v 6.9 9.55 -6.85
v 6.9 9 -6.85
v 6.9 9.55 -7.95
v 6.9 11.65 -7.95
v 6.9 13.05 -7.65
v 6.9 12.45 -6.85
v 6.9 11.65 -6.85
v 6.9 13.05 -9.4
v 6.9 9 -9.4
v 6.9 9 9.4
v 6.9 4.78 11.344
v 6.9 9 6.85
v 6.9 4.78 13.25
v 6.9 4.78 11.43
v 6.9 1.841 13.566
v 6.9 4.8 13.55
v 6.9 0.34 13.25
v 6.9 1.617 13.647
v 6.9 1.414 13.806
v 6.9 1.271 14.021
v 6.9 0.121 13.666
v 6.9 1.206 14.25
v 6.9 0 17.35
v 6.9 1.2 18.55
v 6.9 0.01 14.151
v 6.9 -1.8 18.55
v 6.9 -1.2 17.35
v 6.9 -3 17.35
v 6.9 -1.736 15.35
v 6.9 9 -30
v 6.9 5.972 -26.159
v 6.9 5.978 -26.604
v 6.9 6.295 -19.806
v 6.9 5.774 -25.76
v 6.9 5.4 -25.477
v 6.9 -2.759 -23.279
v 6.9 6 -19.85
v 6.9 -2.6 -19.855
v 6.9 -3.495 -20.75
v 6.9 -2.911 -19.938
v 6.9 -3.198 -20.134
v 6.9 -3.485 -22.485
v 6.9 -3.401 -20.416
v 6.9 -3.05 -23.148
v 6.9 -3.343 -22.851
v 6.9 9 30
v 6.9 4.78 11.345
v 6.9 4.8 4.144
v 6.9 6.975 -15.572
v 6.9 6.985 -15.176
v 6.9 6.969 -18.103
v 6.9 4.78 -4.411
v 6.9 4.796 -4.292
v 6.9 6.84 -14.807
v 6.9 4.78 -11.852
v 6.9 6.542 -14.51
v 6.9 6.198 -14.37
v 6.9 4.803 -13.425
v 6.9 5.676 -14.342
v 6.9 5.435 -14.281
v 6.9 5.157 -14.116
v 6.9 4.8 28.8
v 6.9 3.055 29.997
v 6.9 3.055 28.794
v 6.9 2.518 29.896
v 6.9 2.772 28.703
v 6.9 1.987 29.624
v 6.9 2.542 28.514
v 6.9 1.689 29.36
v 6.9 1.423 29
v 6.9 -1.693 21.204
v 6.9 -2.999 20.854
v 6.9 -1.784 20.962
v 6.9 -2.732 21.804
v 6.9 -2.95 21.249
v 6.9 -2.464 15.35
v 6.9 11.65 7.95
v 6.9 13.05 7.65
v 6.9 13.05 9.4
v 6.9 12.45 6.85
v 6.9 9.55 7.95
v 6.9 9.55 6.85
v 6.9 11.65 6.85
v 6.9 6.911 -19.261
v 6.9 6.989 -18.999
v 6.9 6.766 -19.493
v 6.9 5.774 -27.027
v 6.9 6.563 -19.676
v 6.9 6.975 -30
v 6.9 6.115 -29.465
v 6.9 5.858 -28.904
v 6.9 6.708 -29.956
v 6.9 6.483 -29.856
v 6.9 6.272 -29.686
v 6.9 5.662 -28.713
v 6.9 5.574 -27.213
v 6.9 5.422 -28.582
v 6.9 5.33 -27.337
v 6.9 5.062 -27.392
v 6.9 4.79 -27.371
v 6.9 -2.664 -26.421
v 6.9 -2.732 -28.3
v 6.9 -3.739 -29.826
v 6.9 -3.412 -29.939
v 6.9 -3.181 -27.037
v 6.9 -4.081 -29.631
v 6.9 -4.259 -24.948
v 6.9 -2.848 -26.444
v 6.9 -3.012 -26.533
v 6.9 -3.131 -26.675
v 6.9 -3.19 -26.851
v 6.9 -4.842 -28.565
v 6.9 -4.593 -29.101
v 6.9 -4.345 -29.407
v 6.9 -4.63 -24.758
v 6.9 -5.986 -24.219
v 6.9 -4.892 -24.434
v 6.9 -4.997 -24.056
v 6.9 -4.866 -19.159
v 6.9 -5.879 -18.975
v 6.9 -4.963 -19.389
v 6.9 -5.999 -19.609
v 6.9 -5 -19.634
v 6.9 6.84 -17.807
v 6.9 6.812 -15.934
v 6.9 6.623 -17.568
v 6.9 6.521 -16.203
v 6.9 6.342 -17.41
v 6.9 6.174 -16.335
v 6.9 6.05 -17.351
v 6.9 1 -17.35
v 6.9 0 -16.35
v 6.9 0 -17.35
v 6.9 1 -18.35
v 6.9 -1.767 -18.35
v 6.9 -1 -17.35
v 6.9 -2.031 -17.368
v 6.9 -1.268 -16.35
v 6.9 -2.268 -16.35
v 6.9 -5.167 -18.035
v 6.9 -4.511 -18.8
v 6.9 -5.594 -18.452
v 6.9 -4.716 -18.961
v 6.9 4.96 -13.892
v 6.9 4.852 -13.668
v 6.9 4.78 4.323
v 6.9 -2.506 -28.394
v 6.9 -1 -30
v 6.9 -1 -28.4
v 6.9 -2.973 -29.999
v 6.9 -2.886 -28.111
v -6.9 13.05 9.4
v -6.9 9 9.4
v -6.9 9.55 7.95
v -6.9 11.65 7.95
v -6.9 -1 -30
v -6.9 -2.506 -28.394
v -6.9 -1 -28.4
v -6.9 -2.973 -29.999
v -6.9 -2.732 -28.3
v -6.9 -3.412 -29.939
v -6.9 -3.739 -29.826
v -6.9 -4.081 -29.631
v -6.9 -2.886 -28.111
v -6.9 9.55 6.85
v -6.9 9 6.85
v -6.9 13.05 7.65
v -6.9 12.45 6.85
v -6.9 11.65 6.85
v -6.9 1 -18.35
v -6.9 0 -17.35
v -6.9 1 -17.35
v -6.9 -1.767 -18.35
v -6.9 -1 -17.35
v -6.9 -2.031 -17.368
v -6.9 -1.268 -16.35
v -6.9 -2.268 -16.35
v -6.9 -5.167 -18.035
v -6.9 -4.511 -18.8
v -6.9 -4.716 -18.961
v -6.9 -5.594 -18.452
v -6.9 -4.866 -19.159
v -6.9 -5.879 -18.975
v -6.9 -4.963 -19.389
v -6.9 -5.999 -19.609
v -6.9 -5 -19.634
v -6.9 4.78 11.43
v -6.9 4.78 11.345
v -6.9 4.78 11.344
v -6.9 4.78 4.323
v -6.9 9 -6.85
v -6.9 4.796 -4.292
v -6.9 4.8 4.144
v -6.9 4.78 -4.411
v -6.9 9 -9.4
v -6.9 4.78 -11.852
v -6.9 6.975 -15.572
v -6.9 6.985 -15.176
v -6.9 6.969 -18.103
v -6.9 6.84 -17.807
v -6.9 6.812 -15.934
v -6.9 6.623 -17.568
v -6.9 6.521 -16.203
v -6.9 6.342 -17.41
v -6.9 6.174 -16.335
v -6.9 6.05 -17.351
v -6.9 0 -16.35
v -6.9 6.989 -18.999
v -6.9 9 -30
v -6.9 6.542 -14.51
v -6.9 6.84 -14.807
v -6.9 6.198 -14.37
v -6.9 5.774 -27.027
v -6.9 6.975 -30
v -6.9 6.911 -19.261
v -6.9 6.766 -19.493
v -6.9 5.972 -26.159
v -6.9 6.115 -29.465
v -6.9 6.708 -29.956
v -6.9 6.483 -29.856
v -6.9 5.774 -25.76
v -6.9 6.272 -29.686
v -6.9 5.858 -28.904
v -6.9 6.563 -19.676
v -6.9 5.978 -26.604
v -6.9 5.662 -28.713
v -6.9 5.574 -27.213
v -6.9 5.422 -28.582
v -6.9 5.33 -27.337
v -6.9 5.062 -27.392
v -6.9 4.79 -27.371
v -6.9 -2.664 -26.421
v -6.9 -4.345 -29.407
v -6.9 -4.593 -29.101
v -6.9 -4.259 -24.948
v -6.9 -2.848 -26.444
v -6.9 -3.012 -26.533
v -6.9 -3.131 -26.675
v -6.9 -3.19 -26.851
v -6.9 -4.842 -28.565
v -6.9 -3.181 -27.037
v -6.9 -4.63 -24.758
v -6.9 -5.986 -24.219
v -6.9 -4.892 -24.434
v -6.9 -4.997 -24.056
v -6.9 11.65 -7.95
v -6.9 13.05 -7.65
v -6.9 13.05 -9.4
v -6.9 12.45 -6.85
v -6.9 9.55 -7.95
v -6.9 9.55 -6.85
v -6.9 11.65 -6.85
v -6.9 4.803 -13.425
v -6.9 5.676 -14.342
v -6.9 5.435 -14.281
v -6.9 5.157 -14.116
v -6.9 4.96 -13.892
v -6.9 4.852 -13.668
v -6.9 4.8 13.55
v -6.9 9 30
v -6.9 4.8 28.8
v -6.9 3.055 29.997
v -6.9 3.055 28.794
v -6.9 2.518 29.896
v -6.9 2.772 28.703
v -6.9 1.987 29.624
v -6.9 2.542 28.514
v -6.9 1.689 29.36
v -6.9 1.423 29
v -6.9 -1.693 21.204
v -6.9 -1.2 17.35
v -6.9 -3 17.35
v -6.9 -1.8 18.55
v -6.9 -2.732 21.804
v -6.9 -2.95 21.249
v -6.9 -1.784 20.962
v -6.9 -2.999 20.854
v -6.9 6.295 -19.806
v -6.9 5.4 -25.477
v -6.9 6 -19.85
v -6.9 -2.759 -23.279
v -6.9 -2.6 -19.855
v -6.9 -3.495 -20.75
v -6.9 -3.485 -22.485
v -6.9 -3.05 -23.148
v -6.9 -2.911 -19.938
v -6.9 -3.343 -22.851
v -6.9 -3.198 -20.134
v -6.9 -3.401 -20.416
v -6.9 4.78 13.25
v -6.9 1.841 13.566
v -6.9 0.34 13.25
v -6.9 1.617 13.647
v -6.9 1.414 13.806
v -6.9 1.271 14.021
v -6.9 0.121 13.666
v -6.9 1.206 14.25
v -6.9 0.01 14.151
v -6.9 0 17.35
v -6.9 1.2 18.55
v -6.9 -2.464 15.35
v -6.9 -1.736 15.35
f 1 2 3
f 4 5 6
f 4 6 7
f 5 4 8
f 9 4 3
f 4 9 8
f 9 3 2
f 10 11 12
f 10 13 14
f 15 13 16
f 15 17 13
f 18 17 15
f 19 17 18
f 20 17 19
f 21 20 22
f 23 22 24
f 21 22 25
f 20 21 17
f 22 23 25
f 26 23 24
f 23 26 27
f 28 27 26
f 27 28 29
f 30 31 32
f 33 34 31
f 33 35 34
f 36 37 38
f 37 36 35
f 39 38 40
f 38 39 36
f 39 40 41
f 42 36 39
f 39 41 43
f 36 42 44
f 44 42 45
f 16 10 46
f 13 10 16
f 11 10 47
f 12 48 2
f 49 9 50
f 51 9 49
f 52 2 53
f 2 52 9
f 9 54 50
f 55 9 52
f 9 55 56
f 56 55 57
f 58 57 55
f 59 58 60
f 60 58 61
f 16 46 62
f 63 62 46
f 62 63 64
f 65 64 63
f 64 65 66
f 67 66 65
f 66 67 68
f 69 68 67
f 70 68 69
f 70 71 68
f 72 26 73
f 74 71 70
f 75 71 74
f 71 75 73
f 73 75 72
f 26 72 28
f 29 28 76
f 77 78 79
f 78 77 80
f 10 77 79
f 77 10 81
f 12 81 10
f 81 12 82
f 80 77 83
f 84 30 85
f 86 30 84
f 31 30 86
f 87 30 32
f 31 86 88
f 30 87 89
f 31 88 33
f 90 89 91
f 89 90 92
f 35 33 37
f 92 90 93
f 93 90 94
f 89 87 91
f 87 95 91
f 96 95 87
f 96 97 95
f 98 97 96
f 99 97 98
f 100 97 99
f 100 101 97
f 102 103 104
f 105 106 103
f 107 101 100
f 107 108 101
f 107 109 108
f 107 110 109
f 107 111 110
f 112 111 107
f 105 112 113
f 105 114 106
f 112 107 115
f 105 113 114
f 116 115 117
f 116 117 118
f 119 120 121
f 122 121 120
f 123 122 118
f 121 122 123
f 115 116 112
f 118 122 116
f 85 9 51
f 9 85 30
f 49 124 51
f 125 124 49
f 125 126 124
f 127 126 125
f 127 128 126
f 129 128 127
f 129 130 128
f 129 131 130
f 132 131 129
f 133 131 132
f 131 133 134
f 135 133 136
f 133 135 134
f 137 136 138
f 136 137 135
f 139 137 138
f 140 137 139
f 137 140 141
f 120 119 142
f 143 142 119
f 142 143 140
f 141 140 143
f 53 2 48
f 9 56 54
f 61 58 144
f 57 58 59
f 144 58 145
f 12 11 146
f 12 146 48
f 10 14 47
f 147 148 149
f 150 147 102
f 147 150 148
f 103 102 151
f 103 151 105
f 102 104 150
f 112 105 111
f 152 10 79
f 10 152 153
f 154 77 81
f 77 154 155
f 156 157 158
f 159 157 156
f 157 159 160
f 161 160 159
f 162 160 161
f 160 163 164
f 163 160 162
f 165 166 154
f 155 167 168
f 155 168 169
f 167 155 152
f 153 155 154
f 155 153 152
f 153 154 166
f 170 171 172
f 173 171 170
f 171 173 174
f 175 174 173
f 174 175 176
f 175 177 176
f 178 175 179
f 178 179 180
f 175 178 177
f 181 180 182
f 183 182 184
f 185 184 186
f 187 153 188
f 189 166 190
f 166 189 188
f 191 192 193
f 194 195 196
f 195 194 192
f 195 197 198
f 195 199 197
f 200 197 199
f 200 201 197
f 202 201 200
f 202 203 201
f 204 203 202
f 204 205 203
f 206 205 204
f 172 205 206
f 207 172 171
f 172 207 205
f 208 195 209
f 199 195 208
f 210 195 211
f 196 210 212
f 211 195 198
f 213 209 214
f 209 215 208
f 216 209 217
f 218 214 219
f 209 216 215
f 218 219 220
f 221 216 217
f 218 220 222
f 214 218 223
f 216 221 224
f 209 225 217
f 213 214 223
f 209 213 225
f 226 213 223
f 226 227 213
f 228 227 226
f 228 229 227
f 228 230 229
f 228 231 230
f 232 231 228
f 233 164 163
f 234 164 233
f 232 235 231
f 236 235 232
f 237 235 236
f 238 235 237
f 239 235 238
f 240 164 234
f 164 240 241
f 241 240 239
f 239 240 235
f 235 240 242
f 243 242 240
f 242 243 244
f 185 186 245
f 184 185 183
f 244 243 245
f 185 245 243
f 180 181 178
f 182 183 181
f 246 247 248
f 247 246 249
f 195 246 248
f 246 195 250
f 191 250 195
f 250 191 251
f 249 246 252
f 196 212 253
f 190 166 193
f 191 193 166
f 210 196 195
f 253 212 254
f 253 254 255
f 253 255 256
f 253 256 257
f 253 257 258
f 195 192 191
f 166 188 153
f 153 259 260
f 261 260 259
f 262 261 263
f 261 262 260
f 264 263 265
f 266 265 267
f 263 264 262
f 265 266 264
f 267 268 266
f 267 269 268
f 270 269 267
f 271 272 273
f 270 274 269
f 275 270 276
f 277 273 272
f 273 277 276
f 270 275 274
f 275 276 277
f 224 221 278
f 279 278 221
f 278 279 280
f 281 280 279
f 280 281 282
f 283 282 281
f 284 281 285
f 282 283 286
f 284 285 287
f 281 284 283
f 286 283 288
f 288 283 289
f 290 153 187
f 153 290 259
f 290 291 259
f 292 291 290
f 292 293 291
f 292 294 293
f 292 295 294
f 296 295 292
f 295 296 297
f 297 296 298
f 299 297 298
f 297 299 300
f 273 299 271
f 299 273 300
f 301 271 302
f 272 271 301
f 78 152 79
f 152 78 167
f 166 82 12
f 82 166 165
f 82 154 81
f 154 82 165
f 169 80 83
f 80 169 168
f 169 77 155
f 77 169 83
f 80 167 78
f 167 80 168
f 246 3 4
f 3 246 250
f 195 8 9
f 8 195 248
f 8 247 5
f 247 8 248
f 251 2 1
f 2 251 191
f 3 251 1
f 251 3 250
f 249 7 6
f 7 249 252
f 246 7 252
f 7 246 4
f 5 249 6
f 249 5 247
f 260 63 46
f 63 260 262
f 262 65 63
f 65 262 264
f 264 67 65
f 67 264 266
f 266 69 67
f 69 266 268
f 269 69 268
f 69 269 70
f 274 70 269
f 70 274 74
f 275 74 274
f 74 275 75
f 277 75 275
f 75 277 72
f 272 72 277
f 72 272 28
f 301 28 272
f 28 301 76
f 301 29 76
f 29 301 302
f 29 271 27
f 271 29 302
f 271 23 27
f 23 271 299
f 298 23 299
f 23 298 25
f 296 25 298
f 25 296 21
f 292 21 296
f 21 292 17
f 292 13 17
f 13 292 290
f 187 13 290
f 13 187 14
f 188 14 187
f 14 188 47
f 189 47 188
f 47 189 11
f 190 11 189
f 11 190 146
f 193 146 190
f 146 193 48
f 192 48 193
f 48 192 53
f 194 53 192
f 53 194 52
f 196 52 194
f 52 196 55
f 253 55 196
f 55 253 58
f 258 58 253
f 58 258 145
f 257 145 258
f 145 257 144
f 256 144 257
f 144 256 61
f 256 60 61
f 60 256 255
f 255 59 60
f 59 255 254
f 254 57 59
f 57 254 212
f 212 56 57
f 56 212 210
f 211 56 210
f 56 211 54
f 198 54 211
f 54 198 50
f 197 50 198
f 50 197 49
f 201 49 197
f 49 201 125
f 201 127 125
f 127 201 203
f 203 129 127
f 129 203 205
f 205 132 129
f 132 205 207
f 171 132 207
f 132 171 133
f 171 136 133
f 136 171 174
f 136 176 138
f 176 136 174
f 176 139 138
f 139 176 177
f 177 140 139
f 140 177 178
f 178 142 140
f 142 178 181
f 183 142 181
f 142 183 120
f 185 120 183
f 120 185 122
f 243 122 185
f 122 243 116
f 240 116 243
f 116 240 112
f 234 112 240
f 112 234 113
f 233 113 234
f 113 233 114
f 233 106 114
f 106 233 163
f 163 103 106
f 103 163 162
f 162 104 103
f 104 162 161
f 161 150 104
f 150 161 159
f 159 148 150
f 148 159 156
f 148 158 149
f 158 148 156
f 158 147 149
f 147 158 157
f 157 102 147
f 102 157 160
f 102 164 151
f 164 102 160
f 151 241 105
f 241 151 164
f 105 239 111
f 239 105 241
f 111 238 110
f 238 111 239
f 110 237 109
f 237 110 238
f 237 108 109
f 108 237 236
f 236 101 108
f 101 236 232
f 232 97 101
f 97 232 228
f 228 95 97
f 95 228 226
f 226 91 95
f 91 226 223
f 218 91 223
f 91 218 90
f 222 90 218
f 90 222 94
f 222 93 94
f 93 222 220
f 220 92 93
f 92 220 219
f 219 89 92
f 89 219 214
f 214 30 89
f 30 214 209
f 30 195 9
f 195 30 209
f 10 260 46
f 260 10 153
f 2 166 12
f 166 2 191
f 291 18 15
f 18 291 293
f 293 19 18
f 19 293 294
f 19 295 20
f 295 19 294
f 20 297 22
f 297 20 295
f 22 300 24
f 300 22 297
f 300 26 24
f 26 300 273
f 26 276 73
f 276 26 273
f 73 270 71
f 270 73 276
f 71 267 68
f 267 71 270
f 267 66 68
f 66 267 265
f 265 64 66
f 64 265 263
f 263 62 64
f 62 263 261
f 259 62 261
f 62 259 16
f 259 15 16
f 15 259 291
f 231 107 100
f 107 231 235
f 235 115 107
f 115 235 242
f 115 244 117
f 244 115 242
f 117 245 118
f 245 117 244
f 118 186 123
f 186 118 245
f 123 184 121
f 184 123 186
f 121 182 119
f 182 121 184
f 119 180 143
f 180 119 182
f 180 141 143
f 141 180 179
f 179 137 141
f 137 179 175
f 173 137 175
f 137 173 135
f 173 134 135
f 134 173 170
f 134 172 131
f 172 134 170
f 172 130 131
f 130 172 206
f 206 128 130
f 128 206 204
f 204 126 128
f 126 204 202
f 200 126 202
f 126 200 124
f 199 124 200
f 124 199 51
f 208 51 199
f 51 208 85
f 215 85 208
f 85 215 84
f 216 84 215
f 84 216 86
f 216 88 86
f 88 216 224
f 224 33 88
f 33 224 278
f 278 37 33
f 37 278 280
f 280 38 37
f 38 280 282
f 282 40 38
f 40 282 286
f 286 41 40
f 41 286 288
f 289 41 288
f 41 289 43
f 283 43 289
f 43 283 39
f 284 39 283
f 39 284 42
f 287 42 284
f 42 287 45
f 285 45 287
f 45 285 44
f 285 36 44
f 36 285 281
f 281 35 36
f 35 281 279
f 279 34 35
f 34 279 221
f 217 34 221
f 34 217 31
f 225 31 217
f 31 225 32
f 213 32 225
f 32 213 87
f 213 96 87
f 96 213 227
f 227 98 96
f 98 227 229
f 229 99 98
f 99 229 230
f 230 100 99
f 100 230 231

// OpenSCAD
// HiLetgo level-shifter DIN mount — Cable Clamp remix
// Design version: 6
// VERSIONING RULE: Increment design_version by 1 for every repository check-in of this design.
//
// This is the official HiLetgo level-shifter DIN holder for this project.
// It is based on the user-supplied DIN_Rail_Cable_Clamp.step.
//
// What changed from the cable clamp:
//   1. The two center cable-rest arms are removed completely.
//   2. The two rectangular cable-tie slots in the spine are filled.
//   3. A true full-width top/bottom slide cradle is added for the HiLetgo PCB.
//   4. The PCB is parallel to the DIN rail and slides in from either X side.
//   5. v4 flips the PCB cradle to the OPPOSITE (+Y) face of the DIN body.
//      The v3 cradle was on the cable-clamp-arm side; this version mounts the
//      PCB on the other side of the central DIN spine.
//   6. v5 widens the entire DIN clip body to exactly match the PCB cradle width.
//      There is no longer a wider cradle sitting on a narrower DIN body.
//   7. v6 renames the official source file to remove the ChatGPT prefix.
//
// The original STEP is effectively a 6 mm-wide extrusion. To keep this
// OpenSCAD source compact and robust, its center-plane Y/Z profile was captured
// from the STEP-derived mesh and simplified to ~0.03 mm. In v5 that same DIN
// spring/hook profile is extruded to the PCB cradle width instead of the original
// 6 mm, so the complete mount has one consistent width.

$fn = 48;
design_version = 6;

// ---------- HiLetgo PCB ----------
pcb_z = 15.3;             // board height in installed orientation
pcb_x = 12.6;             // board width across the DIN clip
pcb_t = 1.6;              // board thickness (Y)
pcb_edge_clear = 0.30;     // top/bottom clearance
pcb_face_clear = 0.25;     // front/rear clearance

// ---------- Mount / cradle ----------
cradle_side_margin = 0.60;
mount_width = pcb_x + 2*cradle_side_margin;  // 13.8 mm: DIN body and PCB cradle match
spine_front_y = 4.80;      // cable-arm side of the remaining center spine
spine_back_y = 9.00;       // opposite face of the DIN spine

// v4: PCB holder is on the +Y side of the spine (opposite v3).
// The board sits just outside the spine and slides in from either X side.
pcb_inner_y = spine_back_y + 0.80;
pcb_outer_y = pcb_inner_y + pcb_t;
slot_inner_y = pcb_inner_y - pcb_face_clear;
slot_outer_y = pcb_outer_y + pcb_face_clear;

board_half_z = pcb_z/2;
channel_inner_z = board_half_z + pcb_edge_clear;
channel_wall_t = 1.45;
channel_outer_z = channel_inner_z + channel_wall_t;
edge_overlap = 1.10;
outer_lip_t = 0.80;
lead_in = 0.60;

cradle_width_x = mount_width;  // exactly the same width as the DIN clip body

// ---------- STEP-derived 2D DIN profile ----------
// Coordinates are [Y depth, Z vertical].  Only the two DIN-spring voids are
// retained as holes.  The original rectangular cable-tie slots are intentionally
// NOT subtracted, so they become solid in this PCB-mount remix.
source_outer = [
    [0.0000, -16.3500],
    [0.0000, -17.3500],
    [-1.0000, -17.3500],
    [-1.2679, -16.3500],
    [-2.2679, -16.3500],
    [-5.1675, -18.0355],
    [-5.5943, -18.4518],
    [-5.8794, -18.9754],
    [-5.9994, -19.6095],
    [-5.9859, -24.2194],
    [-4.8419, -28.5652],
    [-4.5932, -29.1009],
    [-4.3446, -29.4072],
    [-4.0813, -29.6307],
    [-3.7387, -29.8263],
    [-3.4123, -29.9393],
    [-2.9728, -29.9994],
    [-1.0000, -30.0000],
    [-1.0000, -28.4000],
    [-2.5064, -28.3945],
    [-2.7320, -28.3004],
    [-2.8860, -28.1106],
    [-3.1812, -27.0372],
    [-3.1905, -26.8515],
    [-3.1313, -26.6752],
    [-3.0118, -26.5328],
    [-2.8485, -26.4439],
    [-2.6640, -26.4208],
    [5.4219, -28.5823],
    [5.6620, -28.7130],
    [5.8577, -28.9039],
    [6.1149, -29.4654],
    [6.2722, -29.6858],
    [6.4830, -29.8560],
    [6.7079, -29.9564],
    [6.9753, -29.9997],
    [9.0000, -30.0000],
    [9.0000, 30.0000],
    [3.0550, 29.9975],
    [2.5177, 29.8959],
    [1.9872, 29.6239],
    [1.6886, 29.3603],
    [1.4226, 29.0000],
    [-2.7321, 21.8038],
    [-2.9499, 21.2489],
    [-2.9994, 20.8537],
    [-3.0000, 17.3500],
    [-2.4641, 15.3500],
    [-1.7359, 15.3500],
    [-1.2000, 17.3500],
    [0.0000, 17.3500],
    [0.0099, 14.1509],
    [0.1206, 13.6660],
    [0.3761, 13.1825],
    [0.6035, 12.9183],
    [0.8734, 12.6975],
    [1.1774, 12.5270],
    [1.5550, 12.4001],
    [1.9501, 12.3506],
    [4.0143, 12.3490],
    [4.3492, 12.2596],
    [4.6306, 12.0247],
    [4.7784, 11.7112],
    [4.7805, 11.3446],
    [4.6238, 11.0132],
    [4.2831, 10.7568],
    [4.0647, 10.7016],
    [3.8396, 10.7075],
    [-1.0000, 12.0000],
    [-5.1490, 11.9888],
    [-5.4339, 11.9010],
    [-5.6802, 11.7331],
    [-5.8782, 11.4783],
    [-5.9802, 11.1981],
    [-5.9888, 8.8510],
    [-5.8400, 8.4575],
    [-5.5214, 8.1467],
    [-5.2708, 8.0374],
    [-5.0249, 8.0003],
    [-1.0000, 8.0000],
    [2.7186, 6.9998],
    [3.4513, 6.6486],
    [4.0135, 6.1689],
    [4.4757, 5.5006],
    [4.7262, 4.8053],
    [4.8000, 4.1439],
    [4.7963, -4.2920],
    [4.7262, -4.8053],
    [4.5965, -5.2301],
    [4.4055, -5.6311],
    [4.1573, -5.9994],
    [3.8030, -6.3773],
    [3.4513, -6.6486],
    [3.0634, -6.8649],
    [2.5765, -7.0417],
    [-1.0000, -8.0000],
    [-5.1981, -8.0198],
    [-5.4783, -8.1218],
    [-5.6982, -8.2841],
    [-5.8782, -8.5217],
    [-5.9749, -8.7775],
    [-6.0000, -11.0000],
    [-5.9691, -11.2468],
    [-5.8660, -11.5000],
    [-5.6802, -11.7331],
    [-5.4562, -11.8899],
    [-5.1981, -11.9802],
    [-1.0000, -12.0000],
    [3.5893, -10.7716],
    [3.9095, -10.7551],
    [4.2407, -10.8515],
    [4.5847, -11.1292],
    [4.7753, -11.5281],
    [4.8028, -13.4247],
    [4.8521, -13.6685],
    [4.9600, -13.8925],
    [5.1572, -14.1160],
    [5.4347, -14.2809],
    [5.6757, -14.3422],
    [6.1981, -14.3698],
    [6.5425, -14.5100],
    [6.8400, -14.8075],
    [6.9848, -15.1764],
    [6.9749, -15.5725],
    [6.8119, -15.9337],
    [6.5214, -16.2033],
    [6.1736, -16.3348],
];

lower_spring_void = [
    [-4.5107, -18.7997],
    [-2.0306, -17.3676],
    [-1.7673, -18.3500],
    [1.0000, -18.3500],
    [1.0000, -17.3500],
    [6.0498, -17.3512],
    [6.3420, -17.4103],
    [6.6235, -17.5682],
    [6.8400, -17.8075],
    [6.9691, -18.1032],
    [6.9888, -18.9990],
    [6.9115, -19.2613],
    [6.7660, -19.4928],
    [6.5633, -19.6762],
    [6.2948, -19.8056],
    [6.0000, -19.8500],
    [-2.5996, -19.8550],
    [-2.9113, -19.9385],
    [-3.1982, -20.1341],
    [-3.4010, -20.4161],
    [-3.4950, -20.7504],
    [-3.4851, -22.4854],
    [-3.3429, -22.8514],
    [-3.0504, -23.1483],
    [-2.7588, -23.2793],
    [5.3999, -25.4770],
    [5.7740, -25.7604],
    [5.9721, -26.1589],
    [5.9776, -26.6039],
    [5.7740, -27.0267],
    [5.5736, -27.2127],
    [5.3303, -27.3374],
    [5.0623, -27.3916],
    [4.7896, -27.3712],
    [-4.2588, -24.9479],
    [-4.6301, -24.7585],
    [-4.8919, -24.4342],
    [-4.9973, -24.0560],
    [-4.9997, -19.6345],
    [-4.9626, -19.3886],
    [-4.8660, -19.1594],
    [-4.7159, -18.9612],
];

upper_spring_void = [
    [4.8000, 28.8000],
    [4.8000, 13.5500],
    [1.8415, 13.5659],
    [1.6174, 13.6474],
    [1.4136, 13.8059],
    [1.2708, 14.0210],
    [1.2062, 14.2505],
    [1.2000, 18.5500],
    [-1.8000, 18.5500],
    [-1.7841, 20.9624],
    [-1.6928, 21.2038],
    [2.5419, 28.5142],
    [2.7721, 28.7026],
    [3.0552, 28.7938],
];

module source_profile_2d() {
    difference() {
        polygon(points=source_outer);
        polygon(points=lower_spring_void);
        polygon(points=upper_spring_void);
    }
}

module rect_yz(y0,y1,z0,z1) {
    translate([y0,z0]) square([y1-y0,z1-z0], center=false);
}

module clip_without_cable_arms_2d() {
    difference() {
        source_profile_2d();
        // Removes both center cable-rest arms while stopping just before the
        // central spine.  Upper/lower DIN spring hooks are untouched.
        rect_yz(-6.20, spine_front_y-0.02, -13.25, 13.25);
    }
}

module din_clip_body() {
    // Original DIN clip, with the cable-rest arms removed.
    multmatrix([
        [0,0,1,0],
        [1,0,0,0],
        [0,1,0,0],
        [0,0,0,1]
    ])
        linear_extrude(height=mount_width, center=true, convexity=20)
            clip_without_cable_arms_2d();
}

module pcb_cradle() {
    // v4 holder is on the +Y face of the DIN spine.
    // The PCB slides along X between top/bottom edge channels.
    xw = cradle_width_x;
    bridge_y0 = spine_back_y - 0.25;  // overlap body for a robust union
    bridge_y1 = slot_outer_y + outer_lip_t + lead_in;

    // TOP channel: overhead bridge/wall.
    translate([0, (bridge_y0+bridge_y1)/2,
               (channel_inner_z+channel_outer_z)/2])
        cube([xw, bridge_y1-bridge_y0,
              channel_outer_z-channel_inner_z], center=true);

    // Inner support ledge (spine side).
    translate([0, (bridge_y0+slot_inner_y)/2,
               channel_inner_z-edge_overlap/2])
        cube([xw, slot_inner_y-bridge_y0, edge_overlap], center=true);

    // Outer retaining lip.
    translate([0, slot_outer_y+outer_lip_t/2,
               channel_inner_z-edge_overlap/2])
        cube([xw, outer_lip_t, edge_overlap], center=true);

    // Outer lead-in ramp.
    hull() {
        translate([0, slot_outer_y+outer_lip_t+lead_in-0.05,
                   channel_inner_z-0.15])
            cube([xw,0.10,0.30], center=true);
        translate([0, slot_outer_y+outer_lip_t-0.05,
                   channel_inner_z-edge_overlap/2])
            cube([xw,0.10,edge_overlap], center=true);
    }

    // BOTTOM channel, mirrored in Z.
    translate([0, (bridge_y0+bridge_y1)/2,
               -(channel_inner_z+channel_outer_z)/2])
        cube([xw, bridge_y1-bridge_y0,
              channel_outer_z-channel_inner_z], center=true);

    translate([0, (bridge_y0+slot_inner_y)/2,
               -channel_inner_z+edge_overlap/2])
        cube([xw, slot_inner_y-bridge_y0, edge_overlap], center=true);

    translate([0, slot_outer_y+outer_lip_t/2,
               -channel_inner_z+edge_overlap/2])
        cube([xw, outer_lip_t, edge_overlap], center=true);

    hull() {
        translate([0, slot_outer_y+outer_lip_t+lead_in-0.05,
                   -channel_inner_z+0.15])
            cube([xw,0.10,0.30], center=true);
        translate([0, slot_outer_y+outer_lip_t-0.05,
                   -channel_inner_z+edge_overlap/2])
            cube([xw,0.10,edge_overlap], center=true);
    }
}

module mount() {
    union() {
        din_clip_body();
        pcb_cradle();
    }
}

mount();

// Preview-only PCB envelope. Set to true to verify the actual 15.3 x 12.6 x 1.6 board fit.
show_reference_pcb = false;
if (show_reference_pcb)
    %translate([0, (pcb_inner_y+pcb_outer_y)/2, 0])
        cube([pcb_x, pcb_t, pcb_z], center=true);
